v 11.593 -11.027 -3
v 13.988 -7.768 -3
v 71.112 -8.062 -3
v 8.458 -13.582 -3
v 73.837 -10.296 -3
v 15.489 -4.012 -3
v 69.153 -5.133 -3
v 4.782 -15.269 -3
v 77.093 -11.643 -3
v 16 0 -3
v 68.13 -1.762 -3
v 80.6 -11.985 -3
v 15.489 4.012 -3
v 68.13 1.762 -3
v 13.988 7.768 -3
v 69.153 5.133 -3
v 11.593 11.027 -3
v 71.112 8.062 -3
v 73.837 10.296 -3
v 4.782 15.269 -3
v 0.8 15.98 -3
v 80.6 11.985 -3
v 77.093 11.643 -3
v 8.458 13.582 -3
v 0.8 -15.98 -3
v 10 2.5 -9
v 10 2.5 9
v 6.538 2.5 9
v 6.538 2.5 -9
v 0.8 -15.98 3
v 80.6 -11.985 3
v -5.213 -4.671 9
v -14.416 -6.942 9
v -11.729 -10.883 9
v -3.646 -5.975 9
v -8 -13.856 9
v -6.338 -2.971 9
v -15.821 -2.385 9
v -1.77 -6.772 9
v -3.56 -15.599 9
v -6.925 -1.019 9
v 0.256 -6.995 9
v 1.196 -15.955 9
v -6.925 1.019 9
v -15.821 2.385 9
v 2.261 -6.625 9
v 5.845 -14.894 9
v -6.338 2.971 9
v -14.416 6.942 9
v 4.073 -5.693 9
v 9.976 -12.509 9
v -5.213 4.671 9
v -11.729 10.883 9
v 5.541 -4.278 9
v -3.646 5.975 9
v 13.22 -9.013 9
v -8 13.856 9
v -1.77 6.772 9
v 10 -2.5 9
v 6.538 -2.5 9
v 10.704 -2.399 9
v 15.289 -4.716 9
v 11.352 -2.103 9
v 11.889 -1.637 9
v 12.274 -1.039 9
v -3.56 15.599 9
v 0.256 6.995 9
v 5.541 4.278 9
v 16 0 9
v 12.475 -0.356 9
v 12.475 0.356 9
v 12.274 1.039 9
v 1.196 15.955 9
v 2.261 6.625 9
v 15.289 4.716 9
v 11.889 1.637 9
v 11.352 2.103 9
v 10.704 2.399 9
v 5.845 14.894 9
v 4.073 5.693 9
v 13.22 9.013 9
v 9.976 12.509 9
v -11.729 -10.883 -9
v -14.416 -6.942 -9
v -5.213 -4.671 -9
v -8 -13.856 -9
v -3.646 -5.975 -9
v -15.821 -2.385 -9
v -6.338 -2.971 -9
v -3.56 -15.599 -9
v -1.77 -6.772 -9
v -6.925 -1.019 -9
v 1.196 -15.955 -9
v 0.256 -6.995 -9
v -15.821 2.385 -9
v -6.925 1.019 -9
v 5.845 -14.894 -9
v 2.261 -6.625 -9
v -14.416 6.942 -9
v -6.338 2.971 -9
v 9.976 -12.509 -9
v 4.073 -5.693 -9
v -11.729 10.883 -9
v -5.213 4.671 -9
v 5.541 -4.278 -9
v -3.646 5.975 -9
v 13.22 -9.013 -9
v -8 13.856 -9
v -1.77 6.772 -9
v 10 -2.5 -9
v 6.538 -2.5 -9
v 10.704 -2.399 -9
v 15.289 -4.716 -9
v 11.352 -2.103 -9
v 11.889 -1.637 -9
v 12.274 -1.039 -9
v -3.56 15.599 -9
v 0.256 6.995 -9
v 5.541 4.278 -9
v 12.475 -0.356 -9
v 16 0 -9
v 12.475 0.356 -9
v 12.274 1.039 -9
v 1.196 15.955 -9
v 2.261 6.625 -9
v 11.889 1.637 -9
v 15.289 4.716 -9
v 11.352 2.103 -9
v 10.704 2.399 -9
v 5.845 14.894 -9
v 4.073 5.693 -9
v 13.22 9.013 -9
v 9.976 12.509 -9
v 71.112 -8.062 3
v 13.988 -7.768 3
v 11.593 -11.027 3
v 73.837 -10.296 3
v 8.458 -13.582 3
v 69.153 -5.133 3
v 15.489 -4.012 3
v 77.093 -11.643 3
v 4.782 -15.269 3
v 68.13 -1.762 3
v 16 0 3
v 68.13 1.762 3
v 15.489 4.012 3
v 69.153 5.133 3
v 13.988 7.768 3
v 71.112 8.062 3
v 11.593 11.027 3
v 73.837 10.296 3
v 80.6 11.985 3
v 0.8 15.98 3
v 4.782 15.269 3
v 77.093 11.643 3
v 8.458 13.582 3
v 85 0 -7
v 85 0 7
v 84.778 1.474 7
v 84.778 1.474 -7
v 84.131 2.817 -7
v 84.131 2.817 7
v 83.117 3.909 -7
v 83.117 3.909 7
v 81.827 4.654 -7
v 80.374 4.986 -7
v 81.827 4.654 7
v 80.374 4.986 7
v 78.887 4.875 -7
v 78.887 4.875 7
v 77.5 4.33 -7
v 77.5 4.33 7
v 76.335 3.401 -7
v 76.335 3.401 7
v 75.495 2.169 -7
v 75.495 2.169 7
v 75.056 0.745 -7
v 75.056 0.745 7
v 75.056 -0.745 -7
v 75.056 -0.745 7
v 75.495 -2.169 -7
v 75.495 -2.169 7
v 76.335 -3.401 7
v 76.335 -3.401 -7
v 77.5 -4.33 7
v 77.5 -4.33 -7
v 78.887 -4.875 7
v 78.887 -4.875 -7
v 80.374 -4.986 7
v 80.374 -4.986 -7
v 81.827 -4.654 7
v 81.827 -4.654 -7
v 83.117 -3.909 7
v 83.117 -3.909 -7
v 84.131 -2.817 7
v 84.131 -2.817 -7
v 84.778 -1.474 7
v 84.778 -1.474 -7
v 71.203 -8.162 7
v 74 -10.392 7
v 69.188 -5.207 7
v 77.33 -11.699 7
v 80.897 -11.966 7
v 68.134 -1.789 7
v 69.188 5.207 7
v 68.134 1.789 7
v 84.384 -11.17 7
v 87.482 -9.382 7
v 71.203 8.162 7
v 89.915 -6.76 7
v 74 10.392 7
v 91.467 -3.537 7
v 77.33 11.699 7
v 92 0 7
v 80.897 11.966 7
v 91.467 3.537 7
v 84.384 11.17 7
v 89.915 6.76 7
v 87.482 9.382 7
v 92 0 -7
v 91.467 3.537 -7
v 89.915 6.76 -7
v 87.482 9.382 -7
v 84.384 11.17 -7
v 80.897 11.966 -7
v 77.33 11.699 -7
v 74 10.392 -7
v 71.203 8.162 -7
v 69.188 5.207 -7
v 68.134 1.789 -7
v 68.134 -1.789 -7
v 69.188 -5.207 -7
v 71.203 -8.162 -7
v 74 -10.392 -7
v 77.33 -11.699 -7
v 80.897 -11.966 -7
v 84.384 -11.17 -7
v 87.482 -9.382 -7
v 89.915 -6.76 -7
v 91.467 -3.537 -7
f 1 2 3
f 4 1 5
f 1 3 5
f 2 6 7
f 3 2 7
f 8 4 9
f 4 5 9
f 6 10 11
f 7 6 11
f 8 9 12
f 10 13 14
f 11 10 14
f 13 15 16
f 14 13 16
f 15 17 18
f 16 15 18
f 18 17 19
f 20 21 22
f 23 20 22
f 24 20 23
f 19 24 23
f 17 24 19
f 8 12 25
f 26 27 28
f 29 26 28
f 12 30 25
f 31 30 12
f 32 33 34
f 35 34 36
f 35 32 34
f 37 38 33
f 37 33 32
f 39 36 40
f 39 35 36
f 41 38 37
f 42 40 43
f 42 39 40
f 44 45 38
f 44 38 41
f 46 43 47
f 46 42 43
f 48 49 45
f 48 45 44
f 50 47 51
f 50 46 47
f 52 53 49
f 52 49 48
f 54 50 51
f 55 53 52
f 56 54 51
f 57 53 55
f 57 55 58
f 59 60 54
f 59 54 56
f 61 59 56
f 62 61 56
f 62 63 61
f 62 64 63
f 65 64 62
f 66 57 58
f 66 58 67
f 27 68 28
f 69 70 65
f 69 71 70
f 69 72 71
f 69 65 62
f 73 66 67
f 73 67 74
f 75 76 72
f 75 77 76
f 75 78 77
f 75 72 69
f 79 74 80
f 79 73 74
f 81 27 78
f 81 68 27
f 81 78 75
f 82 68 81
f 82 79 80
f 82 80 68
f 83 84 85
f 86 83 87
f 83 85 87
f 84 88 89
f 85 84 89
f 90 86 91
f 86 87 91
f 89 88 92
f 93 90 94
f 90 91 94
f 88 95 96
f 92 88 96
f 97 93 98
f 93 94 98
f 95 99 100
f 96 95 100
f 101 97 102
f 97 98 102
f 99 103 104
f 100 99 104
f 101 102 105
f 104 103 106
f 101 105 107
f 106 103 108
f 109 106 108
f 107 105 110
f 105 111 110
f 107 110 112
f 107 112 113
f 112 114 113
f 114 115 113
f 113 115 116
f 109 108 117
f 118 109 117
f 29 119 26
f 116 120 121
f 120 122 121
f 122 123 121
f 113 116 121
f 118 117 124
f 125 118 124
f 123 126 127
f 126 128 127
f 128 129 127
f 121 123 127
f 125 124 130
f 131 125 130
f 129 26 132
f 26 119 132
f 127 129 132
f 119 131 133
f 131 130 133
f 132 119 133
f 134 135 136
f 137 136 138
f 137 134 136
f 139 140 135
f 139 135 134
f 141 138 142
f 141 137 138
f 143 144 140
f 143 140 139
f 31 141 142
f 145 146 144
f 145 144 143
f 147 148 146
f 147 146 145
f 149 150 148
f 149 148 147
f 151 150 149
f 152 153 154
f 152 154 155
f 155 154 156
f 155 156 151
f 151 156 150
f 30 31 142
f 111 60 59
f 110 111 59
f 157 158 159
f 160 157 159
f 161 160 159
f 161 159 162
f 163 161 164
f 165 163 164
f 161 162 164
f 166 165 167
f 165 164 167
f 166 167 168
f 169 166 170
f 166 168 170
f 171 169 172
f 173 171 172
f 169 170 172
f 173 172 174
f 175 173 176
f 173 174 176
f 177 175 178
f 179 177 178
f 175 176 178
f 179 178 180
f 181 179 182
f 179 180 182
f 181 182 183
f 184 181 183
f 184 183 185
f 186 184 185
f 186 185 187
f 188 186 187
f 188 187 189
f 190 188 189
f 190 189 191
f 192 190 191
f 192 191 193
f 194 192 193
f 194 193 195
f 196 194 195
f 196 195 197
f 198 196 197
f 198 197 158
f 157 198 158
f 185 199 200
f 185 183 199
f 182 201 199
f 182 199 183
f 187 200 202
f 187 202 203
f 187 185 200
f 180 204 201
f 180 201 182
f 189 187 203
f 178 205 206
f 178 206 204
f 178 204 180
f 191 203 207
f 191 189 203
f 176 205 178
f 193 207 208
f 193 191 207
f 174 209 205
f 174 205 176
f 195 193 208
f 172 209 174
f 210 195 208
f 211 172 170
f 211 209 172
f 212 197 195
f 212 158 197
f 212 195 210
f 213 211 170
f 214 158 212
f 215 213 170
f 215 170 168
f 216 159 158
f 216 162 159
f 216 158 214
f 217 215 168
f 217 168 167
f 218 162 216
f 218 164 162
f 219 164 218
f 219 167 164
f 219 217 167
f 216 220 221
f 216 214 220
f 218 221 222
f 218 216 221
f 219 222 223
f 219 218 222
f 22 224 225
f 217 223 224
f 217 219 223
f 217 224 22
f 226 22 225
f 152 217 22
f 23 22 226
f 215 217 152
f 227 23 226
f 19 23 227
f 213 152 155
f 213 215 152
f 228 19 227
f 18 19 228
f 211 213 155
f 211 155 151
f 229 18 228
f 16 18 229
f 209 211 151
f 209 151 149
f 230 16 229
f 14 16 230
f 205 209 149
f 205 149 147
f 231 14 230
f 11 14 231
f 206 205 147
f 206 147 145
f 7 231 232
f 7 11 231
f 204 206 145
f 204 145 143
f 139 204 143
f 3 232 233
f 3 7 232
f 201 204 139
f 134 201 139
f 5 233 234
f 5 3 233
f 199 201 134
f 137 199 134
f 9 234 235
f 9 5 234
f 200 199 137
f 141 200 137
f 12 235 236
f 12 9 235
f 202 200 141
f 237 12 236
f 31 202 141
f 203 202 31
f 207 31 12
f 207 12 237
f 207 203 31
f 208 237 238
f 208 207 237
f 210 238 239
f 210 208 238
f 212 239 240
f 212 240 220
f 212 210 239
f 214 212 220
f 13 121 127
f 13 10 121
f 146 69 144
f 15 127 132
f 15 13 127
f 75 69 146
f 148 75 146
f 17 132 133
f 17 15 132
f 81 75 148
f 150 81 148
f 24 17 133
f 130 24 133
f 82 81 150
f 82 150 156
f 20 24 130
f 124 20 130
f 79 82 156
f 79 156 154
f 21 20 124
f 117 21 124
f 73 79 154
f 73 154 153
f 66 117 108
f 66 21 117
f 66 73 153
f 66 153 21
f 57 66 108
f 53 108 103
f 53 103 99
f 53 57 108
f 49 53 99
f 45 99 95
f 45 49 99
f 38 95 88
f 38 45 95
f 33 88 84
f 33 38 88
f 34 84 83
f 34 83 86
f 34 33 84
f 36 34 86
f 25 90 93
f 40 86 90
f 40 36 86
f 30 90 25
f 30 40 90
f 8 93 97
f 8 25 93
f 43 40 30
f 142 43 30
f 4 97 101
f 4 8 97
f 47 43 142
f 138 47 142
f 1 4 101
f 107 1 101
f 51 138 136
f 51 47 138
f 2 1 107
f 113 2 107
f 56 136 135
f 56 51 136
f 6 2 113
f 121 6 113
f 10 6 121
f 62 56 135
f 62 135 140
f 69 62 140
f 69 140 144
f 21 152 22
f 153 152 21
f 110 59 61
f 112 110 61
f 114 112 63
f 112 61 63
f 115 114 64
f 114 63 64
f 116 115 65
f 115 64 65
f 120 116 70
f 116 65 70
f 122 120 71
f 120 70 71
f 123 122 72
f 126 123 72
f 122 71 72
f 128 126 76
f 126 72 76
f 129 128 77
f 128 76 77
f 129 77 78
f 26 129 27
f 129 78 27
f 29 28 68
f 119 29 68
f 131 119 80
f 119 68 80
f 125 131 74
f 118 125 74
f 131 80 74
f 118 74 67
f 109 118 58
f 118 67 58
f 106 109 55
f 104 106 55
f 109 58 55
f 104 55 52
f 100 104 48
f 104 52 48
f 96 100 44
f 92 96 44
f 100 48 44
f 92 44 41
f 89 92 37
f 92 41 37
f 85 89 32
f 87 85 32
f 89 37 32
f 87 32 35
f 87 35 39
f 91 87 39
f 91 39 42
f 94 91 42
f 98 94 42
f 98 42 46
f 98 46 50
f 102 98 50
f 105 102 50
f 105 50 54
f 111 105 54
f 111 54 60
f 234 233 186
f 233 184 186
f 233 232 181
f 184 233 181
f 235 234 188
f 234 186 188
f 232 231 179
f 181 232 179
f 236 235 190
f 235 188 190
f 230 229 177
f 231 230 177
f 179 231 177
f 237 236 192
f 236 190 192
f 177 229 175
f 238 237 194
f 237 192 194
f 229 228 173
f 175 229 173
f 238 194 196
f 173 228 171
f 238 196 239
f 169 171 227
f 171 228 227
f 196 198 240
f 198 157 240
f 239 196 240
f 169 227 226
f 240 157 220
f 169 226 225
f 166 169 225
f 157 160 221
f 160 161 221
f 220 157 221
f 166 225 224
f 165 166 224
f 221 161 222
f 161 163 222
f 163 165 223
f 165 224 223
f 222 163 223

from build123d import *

# Parameters (mm, degrees)
F0_R          = 16
F1_DEPTH      = 9
F1_DEPTH_BACK = 9
F2_R          = 12
F3_DEPTH      = 7
F3_DEPTH_BACK = 7
F5_DEPTH      = 3
F5_DEPTH_BACK = 3
F7_DEPTH      = 18.001
F8_R          = 5
F9_DEPTH      = 16.001


with BuildPart() as f1:
    # F0 (on Top) → F1 (new body, two sides)
    with BuildSketch(Plane.XY) as f1_sk:
        Circle(F0_R)
    extrude(amount=F1_DEPTH)
    extrude(f1_sk.sketch, amount=-F1_DEPTH_BACK)



with BuildPart() as f3:
    # F2 (on Top) → F3 (new body, two sides)
    with BuildSketch(Plane.XY) as f3_sk:
        with Locations((80, 0)):
            Circle(F2_R)
    extrude(amount=F3_DEPTH)
    extrude(f3_sk.sketch, amount=-F3_DEPTH_BACK)


with BuildPart() as f1_1:
    add(f1.part)

    add(f3.part)  # F5 merges F3
    # F4 (on Top) → F5 (join, two sides)
    with BuildSketch(Plane.XY) as f5_sk:
        Polygon((80.6, 11.9849906133), (0.8, 15.9799874844), (0.8, -15.9799874844), (80.6, -11.9849906133), align=None)
    extrude(amount=F5_DEPTH)
    extrude(f5_sk.sketch, amount=-F5_DEPTH_BACK)

    # F6 (on face) → F7 (cut, through all)
    with BuildSketch(Plane.XY.offset(9)):
        with BuildLine():
            Line((10, 2.5), (6.5383484153, 2.5))
            ThreePointArc((6.5383484153, 2.5), (-7, 0), (6.5383484153, -2.5))
            Line((6.5383484153, -2.5), (10, -2.5))
            ThreePointArc((10, -2.5), (12.5, 0), (10, 2.5))
        make_face()
    extrude(amount=-F7_DEPTH, mode=Mode.SUBTRACT)

    # F8 (on face) → F9 (cut, through all)
    with BuildSketch(Plane.XY.offset(7)):
        with Locations((80, 0)):
            Circle(F8_R)
    extrude(amount=-F9_DEPTH, mode=Mode.SUBTRACT)


solid = f1_1.part
